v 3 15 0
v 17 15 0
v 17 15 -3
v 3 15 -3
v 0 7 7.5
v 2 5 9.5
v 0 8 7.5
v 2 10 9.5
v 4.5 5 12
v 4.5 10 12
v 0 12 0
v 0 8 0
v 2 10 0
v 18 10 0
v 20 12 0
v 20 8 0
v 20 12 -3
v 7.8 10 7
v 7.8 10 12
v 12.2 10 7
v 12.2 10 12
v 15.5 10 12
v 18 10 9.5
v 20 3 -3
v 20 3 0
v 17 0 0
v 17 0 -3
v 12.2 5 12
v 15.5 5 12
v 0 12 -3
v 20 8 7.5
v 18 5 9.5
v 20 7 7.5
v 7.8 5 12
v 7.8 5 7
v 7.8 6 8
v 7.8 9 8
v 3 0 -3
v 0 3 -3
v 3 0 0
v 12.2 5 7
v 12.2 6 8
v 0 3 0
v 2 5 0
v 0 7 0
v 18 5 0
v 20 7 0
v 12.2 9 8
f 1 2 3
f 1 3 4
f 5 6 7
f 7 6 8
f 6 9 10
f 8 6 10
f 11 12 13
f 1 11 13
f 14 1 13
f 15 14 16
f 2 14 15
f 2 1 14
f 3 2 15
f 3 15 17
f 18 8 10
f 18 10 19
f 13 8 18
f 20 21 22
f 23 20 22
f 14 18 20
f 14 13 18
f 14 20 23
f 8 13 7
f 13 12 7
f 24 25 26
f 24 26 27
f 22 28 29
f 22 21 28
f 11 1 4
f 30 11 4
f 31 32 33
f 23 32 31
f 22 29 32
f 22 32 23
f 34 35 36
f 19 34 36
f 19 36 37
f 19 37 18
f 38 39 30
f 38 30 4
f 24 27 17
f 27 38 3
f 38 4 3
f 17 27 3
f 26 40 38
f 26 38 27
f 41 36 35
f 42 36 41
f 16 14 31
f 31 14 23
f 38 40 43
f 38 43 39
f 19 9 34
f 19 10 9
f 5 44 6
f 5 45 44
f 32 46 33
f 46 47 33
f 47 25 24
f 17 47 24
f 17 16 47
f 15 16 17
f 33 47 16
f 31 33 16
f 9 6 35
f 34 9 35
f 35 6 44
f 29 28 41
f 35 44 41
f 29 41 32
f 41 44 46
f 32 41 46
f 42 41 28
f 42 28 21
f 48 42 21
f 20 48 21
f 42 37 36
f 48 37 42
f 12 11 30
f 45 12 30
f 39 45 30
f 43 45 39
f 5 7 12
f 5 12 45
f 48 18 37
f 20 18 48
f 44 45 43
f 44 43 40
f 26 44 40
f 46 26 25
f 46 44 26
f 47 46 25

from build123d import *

# Parameters (mm, degrees)
F0_W     = 7.8
F0_H     = 5
F0_W_2   = 4.4
F1_DEPTH = 3
F2_DEPTH = 12
F3_DEPTH = 8
F4_SIZE  = 2
F5_SIZE  = 4.5
F6_SIZE  = 3
F7_SIZE  = 1


with BuildPart() as f1:
    # F0 (on Top) → F1 (new body)
    with BuildSketch(Plane.XY):
        Polygon((0, 15), (0, 10), (7.8, 10), (12.2, 10), (20, 10), (20, 15), align=None)
        with Locations((3.9, 7.5)):
            Rectangle(F0_W, F0_H)
        with Locations((10, 7.5)):
            Rectangle(F0_W_2, F0_H)
        with Locations((16.1, 7.5)):
            Rectangle(F0_W, F0_H)
        Polygon((0, 5), (0, 0), (20, 0), (20, 5), (12.2, 5), (7.8, 5), align=None)
    extrude(amount=-F1_DEPTH)

    # F0 (on Top) → F2 (join)
    with BuildSketch(Plane.XY):
        with Locations((3.9, 7.5)):
            Rectangle(F0_W, F0_H)
        with Locations((16.1, 7.5)):
            Rectangle(F0_W, F0_H)
    extrude(amount=F2_DEPTH)

    # F0 (on Top) → F3 (join)
    with BuildSketch(Plane.XY):
        with Locations((10, 7.5)):
            Rectangle(F0_W_2, F0_H)
    extrude(amount=F3_DEPTH)

    # F4
    f4_edges = [f1.edges().sort_by_distance(p)[0] for p in [
        (0, 10, 6),
        (0, 5, 6),
        (20, 5, 6),
        (20, 10, 6),
    ]]
    chamfer(f4_edges, length=F4_SIZE)

    # F5
    f5_edges = [f1.edges().sort_by_distance(p)[0] for p in [
        (0, 7.5, 12),
        (20, 7.5, 12),
    ]]
    chamfer(f5_edges, length=F5_SIZE)

    # F6
    f6_edges = [f1.edges().sort_by_distance(p)[0] for p in [
        (0, 15, -1.5),
        (0, 0, -1.5),
        (20, 0, -1.5),
        (20, 15, -1.5),
    ]]
    chamfer(f6_edges, length=F6_SIZE)

    # F7
    f7_edges = [f1.edges().sort_by_distance(p)[0] for p in [
        (10, 5, 8),
        (10, 10, 8),
    ]]
    chamfer(f7_edges, length=F7_SIZE)


solid = f1.part
